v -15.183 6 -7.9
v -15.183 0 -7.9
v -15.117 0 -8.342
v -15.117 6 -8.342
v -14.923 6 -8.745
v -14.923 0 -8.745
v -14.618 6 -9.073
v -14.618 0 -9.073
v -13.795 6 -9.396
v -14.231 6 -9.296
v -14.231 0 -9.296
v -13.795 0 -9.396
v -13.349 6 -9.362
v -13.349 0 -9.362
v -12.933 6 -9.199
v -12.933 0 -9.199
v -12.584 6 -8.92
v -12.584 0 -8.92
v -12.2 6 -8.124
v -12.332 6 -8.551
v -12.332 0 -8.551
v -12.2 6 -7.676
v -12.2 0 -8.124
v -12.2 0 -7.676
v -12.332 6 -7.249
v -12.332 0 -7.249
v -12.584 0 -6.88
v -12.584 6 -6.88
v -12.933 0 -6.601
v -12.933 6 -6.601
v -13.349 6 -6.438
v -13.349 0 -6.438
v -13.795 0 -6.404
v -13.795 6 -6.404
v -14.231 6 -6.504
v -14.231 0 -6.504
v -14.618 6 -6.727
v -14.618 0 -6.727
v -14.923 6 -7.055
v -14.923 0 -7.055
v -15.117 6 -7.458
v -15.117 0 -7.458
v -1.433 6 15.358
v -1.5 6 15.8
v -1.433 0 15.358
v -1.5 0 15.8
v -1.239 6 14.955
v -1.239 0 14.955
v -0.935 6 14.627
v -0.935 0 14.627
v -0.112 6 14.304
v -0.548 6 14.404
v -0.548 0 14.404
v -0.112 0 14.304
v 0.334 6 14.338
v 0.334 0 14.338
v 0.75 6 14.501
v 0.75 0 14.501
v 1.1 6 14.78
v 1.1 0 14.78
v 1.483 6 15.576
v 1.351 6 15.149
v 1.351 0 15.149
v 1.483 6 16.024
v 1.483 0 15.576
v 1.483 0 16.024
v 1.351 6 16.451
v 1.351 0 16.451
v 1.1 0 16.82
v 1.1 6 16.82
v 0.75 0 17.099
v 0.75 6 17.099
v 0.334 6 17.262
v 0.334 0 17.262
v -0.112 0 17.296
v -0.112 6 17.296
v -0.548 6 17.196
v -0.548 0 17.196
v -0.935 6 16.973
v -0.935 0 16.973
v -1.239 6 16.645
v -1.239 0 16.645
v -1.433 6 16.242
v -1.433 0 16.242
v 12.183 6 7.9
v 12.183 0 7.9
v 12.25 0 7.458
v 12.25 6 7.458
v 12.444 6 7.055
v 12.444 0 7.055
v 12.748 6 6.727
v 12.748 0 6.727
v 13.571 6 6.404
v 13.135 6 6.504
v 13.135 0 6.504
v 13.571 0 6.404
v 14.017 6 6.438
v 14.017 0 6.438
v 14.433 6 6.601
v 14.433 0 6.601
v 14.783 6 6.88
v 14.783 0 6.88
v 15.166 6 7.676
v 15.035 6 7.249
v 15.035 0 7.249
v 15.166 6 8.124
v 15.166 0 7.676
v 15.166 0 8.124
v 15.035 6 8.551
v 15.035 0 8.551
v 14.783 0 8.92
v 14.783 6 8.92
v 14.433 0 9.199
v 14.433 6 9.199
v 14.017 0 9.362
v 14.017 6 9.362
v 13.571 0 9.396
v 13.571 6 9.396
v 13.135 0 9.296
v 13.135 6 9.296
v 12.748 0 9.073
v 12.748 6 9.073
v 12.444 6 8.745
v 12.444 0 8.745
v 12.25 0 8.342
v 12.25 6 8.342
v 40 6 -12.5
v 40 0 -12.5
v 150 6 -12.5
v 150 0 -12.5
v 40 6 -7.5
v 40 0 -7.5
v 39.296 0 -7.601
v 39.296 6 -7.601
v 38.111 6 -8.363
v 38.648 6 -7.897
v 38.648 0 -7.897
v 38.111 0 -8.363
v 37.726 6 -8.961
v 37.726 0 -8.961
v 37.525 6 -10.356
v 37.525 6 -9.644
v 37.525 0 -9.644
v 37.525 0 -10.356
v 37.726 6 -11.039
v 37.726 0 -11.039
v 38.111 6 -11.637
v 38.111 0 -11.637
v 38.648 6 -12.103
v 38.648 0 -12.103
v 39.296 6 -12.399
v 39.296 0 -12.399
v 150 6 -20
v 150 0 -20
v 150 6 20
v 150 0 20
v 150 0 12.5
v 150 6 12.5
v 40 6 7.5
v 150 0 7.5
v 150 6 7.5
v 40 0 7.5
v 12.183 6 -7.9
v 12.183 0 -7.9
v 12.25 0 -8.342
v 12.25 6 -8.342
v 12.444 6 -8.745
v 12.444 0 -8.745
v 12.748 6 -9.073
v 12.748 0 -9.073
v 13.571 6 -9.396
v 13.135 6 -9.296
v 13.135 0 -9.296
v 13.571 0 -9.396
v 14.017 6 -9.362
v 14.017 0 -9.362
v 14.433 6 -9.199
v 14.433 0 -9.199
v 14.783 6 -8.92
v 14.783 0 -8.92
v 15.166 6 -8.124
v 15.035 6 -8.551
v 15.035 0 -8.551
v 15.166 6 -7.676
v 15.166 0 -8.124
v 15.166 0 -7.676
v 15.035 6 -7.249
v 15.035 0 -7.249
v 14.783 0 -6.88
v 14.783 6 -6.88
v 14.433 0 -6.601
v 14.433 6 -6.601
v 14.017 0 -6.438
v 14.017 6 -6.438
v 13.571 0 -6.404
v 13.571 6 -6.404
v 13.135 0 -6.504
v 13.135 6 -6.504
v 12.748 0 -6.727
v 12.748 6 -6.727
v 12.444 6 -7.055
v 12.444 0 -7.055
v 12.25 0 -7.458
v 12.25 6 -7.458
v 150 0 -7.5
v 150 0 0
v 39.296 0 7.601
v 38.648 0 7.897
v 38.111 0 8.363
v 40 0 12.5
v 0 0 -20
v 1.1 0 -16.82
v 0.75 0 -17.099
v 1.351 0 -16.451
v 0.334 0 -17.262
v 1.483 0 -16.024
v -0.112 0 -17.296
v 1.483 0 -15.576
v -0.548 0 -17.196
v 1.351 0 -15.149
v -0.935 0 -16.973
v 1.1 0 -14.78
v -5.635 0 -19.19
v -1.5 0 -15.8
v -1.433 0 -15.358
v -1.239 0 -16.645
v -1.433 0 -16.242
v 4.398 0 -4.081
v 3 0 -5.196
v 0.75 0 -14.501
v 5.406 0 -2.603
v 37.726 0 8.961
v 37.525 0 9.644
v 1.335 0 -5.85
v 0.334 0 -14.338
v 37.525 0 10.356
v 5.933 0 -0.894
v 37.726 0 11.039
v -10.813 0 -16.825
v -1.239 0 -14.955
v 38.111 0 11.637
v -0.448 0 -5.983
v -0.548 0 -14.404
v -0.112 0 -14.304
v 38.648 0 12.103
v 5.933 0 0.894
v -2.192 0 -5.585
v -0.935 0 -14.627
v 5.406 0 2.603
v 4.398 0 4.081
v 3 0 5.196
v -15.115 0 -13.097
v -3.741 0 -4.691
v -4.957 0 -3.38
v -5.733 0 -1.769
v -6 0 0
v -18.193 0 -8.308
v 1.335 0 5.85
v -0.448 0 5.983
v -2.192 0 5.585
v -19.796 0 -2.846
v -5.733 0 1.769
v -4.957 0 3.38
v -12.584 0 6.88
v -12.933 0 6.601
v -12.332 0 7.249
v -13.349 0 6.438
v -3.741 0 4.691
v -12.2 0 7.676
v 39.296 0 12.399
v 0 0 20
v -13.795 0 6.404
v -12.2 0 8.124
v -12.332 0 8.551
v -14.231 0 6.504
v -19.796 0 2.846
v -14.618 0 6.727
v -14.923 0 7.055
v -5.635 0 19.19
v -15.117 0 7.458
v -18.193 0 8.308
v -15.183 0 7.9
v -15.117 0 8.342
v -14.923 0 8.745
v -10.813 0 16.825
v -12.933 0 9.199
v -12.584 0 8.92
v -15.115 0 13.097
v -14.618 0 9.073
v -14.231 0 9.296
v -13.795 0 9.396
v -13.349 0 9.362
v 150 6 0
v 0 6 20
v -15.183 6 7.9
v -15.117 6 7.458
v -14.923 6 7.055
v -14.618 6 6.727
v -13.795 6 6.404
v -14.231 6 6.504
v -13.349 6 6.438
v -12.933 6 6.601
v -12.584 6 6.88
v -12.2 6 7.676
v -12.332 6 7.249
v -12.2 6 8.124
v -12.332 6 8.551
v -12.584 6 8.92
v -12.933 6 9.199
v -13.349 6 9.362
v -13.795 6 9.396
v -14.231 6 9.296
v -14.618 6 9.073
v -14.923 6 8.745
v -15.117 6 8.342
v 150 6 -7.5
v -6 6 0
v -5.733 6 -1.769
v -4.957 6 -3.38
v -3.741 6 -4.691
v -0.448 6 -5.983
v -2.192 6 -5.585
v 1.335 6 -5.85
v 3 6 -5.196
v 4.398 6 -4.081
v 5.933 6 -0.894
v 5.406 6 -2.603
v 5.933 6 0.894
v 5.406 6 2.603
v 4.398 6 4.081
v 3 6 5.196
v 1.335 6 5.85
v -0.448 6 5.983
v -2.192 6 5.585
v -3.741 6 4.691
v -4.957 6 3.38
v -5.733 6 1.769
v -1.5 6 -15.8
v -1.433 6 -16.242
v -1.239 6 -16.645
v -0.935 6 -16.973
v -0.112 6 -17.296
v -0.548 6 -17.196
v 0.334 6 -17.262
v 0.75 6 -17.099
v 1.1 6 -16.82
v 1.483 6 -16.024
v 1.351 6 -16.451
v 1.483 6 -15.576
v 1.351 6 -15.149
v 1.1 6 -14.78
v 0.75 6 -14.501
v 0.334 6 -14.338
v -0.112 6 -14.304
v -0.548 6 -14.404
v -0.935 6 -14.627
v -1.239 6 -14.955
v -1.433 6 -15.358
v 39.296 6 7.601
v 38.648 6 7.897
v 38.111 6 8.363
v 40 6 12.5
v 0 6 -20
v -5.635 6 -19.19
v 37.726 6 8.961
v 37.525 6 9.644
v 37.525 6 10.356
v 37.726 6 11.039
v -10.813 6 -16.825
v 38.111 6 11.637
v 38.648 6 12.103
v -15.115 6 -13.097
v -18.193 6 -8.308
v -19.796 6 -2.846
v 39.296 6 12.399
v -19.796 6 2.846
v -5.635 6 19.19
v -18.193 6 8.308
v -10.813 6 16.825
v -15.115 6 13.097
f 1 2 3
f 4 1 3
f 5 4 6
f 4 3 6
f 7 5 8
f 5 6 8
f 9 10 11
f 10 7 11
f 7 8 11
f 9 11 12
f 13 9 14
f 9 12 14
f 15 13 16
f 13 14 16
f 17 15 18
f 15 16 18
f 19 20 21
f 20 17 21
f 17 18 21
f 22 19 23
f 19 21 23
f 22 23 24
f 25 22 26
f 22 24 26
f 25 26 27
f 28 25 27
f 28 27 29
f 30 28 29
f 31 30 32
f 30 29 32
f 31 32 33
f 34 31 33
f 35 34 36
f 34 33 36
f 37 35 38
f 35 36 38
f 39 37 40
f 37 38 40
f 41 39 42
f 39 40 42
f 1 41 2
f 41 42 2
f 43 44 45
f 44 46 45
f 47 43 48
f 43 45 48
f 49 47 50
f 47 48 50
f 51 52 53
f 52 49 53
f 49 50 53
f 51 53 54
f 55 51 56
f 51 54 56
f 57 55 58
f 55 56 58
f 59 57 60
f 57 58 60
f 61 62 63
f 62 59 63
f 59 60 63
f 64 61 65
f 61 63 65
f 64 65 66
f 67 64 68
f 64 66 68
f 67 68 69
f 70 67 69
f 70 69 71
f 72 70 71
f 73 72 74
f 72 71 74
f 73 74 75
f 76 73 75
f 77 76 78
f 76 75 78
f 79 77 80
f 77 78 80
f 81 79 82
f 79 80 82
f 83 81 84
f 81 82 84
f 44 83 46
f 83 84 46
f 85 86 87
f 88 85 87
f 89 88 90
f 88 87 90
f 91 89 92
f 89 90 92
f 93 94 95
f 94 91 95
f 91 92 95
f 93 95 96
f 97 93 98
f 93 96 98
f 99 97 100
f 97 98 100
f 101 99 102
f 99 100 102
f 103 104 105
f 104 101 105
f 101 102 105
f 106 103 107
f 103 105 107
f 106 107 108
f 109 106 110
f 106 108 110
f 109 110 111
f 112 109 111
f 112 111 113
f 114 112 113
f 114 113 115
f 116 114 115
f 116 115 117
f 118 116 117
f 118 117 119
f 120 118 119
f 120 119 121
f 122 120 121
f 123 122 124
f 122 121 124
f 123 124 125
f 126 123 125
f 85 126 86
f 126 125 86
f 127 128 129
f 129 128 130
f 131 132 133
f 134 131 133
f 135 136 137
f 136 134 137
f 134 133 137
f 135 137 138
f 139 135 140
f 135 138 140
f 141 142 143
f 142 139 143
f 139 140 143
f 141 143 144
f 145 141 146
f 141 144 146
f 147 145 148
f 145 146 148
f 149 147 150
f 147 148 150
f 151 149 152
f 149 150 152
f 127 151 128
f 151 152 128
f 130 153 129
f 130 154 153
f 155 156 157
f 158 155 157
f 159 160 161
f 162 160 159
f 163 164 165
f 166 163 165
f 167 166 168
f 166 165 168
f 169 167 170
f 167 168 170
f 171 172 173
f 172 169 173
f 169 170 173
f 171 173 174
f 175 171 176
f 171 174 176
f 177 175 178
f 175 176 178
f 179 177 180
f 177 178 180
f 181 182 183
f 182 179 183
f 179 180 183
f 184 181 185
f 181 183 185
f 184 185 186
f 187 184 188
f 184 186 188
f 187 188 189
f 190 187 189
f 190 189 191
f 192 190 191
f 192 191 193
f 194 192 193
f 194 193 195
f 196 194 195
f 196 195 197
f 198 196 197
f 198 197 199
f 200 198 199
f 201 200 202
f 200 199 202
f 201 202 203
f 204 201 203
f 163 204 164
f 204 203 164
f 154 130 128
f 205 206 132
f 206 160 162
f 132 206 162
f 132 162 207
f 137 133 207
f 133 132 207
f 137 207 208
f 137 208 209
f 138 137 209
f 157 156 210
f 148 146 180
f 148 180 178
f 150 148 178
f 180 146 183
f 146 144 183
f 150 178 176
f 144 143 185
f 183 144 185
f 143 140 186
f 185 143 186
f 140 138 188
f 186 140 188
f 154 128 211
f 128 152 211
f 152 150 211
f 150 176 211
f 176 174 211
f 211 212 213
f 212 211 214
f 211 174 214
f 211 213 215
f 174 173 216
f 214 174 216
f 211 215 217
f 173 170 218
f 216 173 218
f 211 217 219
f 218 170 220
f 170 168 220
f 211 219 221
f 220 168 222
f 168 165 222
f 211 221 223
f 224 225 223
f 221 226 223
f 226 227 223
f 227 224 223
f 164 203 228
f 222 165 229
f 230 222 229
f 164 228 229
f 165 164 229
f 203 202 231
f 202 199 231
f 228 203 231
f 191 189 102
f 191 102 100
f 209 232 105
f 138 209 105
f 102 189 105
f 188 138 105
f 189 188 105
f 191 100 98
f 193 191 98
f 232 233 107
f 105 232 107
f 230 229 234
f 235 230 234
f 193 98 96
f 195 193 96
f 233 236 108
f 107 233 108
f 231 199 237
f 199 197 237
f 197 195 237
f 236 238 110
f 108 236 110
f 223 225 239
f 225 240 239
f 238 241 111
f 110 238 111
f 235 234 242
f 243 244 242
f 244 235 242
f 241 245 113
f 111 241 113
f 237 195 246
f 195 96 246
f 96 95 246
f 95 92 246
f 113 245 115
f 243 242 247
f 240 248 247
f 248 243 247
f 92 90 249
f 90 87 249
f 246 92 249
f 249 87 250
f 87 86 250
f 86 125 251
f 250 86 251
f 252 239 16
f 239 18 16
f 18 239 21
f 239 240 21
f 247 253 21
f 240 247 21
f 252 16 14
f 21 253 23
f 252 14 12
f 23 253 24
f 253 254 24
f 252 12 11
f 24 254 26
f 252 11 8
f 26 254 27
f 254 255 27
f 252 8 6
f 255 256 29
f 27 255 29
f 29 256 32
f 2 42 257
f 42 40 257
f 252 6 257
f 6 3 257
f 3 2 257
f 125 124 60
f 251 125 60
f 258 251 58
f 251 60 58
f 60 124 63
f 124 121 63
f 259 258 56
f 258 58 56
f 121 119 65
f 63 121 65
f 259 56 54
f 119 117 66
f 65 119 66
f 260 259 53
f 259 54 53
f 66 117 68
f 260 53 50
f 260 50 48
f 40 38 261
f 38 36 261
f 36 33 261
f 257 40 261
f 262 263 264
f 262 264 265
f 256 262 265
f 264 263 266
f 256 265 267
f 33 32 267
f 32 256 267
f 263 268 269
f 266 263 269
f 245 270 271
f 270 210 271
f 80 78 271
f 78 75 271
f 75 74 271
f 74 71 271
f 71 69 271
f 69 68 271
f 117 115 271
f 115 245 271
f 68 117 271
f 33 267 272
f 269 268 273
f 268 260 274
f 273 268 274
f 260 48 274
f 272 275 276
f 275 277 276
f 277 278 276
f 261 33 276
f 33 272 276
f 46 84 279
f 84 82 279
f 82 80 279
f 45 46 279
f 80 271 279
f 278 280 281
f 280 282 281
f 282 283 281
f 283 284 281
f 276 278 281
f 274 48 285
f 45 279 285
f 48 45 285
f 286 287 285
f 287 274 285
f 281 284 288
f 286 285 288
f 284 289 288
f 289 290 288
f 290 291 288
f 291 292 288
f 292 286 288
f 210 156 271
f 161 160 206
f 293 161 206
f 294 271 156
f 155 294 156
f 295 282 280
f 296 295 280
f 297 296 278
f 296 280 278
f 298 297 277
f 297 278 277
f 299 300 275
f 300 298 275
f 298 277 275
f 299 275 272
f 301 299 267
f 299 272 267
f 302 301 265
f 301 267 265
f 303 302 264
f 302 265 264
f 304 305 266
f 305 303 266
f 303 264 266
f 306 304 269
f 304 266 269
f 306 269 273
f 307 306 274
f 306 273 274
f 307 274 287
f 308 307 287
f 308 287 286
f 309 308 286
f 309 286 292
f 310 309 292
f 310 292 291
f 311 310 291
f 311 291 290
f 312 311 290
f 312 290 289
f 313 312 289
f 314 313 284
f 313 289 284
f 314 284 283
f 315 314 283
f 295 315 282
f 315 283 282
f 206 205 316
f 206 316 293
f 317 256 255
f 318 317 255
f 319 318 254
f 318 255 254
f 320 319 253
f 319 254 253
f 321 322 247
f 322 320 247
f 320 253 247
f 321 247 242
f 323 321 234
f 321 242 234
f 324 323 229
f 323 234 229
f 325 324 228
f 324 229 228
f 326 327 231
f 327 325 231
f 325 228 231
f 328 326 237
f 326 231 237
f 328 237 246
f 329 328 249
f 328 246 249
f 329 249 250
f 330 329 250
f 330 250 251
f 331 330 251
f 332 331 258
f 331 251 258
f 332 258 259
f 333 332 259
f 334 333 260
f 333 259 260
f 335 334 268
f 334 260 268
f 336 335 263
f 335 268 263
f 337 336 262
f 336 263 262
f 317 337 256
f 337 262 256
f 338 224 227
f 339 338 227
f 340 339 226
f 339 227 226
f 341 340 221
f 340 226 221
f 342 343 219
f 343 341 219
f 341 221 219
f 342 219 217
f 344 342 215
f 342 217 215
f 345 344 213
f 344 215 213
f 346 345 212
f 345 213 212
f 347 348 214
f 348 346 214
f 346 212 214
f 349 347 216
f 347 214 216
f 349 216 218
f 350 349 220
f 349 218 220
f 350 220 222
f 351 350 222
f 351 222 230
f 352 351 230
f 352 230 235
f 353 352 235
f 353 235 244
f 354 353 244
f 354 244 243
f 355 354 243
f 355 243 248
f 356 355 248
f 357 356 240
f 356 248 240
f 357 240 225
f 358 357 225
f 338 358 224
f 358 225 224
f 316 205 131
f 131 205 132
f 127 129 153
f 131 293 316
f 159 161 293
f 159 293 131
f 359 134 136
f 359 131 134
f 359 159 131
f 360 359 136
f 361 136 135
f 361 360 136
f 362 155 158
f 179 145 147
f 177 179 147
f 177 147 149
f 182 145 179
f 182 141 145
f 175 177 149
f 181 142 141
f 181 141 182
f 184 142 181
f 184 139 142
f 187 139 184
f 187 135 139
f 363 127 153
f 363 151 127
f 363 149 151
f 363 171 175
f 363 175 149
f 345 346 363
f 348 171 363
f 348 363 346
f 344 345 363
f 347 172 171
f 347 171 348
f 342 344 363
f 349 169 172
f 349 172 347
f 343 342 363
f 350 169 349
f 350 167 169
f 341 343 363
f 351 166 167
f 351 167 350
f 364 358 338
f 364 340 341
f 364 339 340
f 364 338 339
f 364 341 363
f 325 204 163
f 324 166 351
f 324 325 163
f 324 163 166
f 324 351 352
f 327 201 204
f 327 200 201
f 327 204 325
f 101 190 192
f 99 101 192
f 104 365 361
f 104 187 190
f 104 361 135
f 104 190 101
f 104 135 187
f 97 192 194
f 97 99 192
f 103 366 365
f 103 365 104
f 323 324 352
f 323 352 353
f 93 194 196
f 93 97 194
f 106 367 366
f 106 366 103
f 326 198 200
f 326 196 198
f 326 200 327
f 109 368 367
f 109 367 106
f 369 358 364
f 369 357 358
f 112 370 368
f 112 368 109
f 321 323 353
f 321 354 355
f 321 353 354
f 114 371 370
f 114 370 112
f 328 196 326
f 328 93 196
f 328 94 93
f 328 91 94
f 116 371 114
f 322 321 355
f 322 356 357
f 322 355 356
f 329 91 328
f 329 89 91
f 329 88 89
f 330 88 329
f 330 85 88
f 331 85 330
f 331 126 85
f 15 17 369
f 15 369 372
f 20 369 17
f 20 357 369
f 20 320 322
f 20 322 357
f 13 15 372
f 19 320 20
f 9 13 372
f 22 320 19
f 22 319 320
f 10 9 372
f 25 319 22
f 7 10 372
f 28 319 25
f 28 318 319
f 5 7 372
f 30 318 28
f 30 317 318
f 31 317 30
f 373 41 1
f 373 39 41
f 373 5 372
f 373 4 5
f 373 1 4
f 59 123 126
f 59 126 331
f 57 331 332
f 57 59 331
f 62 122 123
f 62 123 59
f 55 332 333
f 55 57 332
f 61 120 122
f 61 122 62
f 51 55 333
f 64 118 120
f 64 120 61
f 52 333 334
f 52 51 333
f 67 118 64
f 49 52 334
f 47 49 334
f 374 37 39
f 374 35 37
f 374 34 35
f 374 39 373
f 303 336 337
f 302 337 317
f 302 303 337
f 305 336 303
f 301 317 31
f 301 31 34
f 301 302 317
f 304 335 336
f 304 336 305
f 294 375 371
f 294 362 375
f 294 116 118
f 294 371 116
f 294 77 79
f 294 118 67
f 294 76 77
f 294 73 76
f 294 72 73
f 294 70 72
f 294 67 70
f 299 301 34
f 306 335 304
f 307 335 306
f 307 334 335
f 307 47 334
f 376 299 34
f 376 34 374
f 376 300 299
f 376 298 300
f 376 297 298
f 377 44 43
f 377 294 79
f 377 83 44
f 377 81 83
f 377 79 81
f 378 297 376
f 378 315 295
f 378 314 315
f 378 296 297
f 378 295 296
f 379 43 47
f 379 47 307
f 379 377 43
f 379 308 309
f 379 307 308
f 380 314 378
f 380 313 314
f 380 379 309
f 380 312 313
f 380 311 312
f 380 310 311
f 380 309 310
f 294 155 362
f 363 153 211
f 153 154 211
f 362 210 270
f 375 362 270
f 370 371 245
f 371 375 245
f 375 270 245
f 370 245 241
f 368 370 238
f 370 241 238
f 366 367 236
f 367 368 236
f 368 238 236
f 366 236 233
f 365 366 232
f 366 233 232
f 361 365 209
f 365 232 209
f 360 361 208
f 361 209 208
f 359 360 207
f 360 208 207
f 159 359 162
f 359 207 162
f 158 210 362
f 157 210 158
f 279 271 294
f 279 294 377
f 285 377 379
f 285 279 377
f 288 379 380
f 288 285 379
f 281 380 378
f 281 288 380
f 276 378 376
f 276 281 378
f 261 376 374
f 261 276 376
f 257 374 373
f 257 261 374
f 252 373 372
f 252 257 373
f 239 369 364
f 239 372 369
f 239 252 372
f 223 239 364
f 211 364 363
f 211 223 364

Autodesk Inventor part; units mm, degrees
ref_plane "YZ Plane" through (0, 0, 0) normal (1, 0, 0) x (0, 1, 0)
ref_plane "XZ Plane" through (0, 0, 0) normal (0, 1, 0) x (-1, 0, 0)
ref_plane "XY Plane" through (0, 0, 0) normal (0, 0, 1) x (1, 0, 0)
sketch "sketch1--base" plane through (0, 0, 0) normal (0, 1, 0) x (-1, 0, 0)
  line L0 (-18.2322, -18.2322) -> (18.2322, 18.2322) construction
  line L1 (21.7082, -21.7082) -> (-21.7082, 21.7082) construction
  line L2 (-20, -20) -> (20, -20) construction
  line L3 (20, -20) -> (20, 20) construction
  line L4 (20, 20) -> (-20, 20) construction
  line L5 (-20, 20) -> (-20, -20) construction
  line L6 (-20, -20) -> (20, 20) construction
  line L7 (20, -20) -> (-20, 20) construction
  line L8 (-21.7678, -21.7678) -> (21.7678, 21.7678) construction
  line L9 (21.7678, -21.7678) -> (-21.7678, 21.7678) construction
  circle A0 centre (-20, 20) radius 2.5 construction
  circle A1 centre (20, 20) radius 2.5 construction
  circle A2 centre (20, -20) radius 2.5 construction
  circle A3 centre (-20, -20) radius 2.5 construction
  arc A4 (17.5, 20) -> (20, 17.5) centre (20, 20) ccw
  arc A5 (20, -17.5) -> (17.5, -20) centre (20, -20) ccw
  arc A6 (-20, 17.5) -> (-17.5, 20) centre (-20, 20) ccw
  arc A7 (-17.5, -20) -> (-20, -17.5) centre (-20, -20) ccw
  line L10 (-17.5, -20) -> (17.5, -20)
  line L11 (-20, -17.5) -> (-20, 17.5)
  line L12 (0, -20) -> (0, 20) construction
  line L13 (20, 0) -> (-20, 0) construction
  line L14 (20, -17.5) -> (20, 17.5)
  line L15 (17.5, 20) -> (-17.5, 20)
  point P0 (0, 0)
  point P1 (20, 0)
  dimension "d6" = 40
  dimension "screw__diameter" = 5
  dimension "d24" = 40
sketch "sketch2--component" plane through (0, 0, 0) normal (0, 1, 0) x (-1, 0, 0)
  circle A0 centre (0, 0) radius 18.5
  circle A1 centre (0, 0) radius 15.8 construction
  circle A2 centre (0, -15.8) radius 1.5
  circle A3 centre (0, 0) radius 17.3 construction
  circle A4 centre (13.6832, -7.9) radius 1.5
  circle A5 centre (13.6832, 7.9) radius 1.5
  circle A6 centre (0, 15.8) radius 1.5
  circle A7 centre (-13.6832, 7.9) radius 1.5
  circle A8 centre (-13.6832, -7.9) radius 1.5
  circle A9 centre (0, 0) radius 6
  dimension "d40" = 37
  dimension "d41" = 1.2
  dimension "d42" = 3
  dimension "d45" = 360
  dimension "d49" = 12
sketch "Sketch3--union" plane through (0, 0, 0) normal (0, 1, 0) x (-1, 0, 0)
  circle A0 centre (13.6832, 7.9) radius 1.5 projected
  circle A1 centre (13.6832, -7.9) radius 1.5 projected
  circle A2 centre (0, -15.8) radius 1.5 projected
  circle A3 centre (-13.6832, -7.9) radius 1.5 projected
  circle A4 centre (-13.6832, 7.9) radius 1.5 projected
  circle A5 centre (0, 15.8) radius 1.5 projected
  circle A6 centre (0, 0) radius 20 construction
  line L0 (20, -20) -> (20, 20) construction
  arc A7 (0, -20) -> (0, 20) centre (0, 0) ccw
  line L1 (0, -20) -> (0, 20) construction
  line L2 (0, 20) -> (-150, 20)
  line L3 (-150, -20) -> (0, -20)
  line L4 (-20, 20) -> (-20, -20) construction
  line L5 (-20, 20) -> (-150, 0) construction
  line L6 (-20, 0) -> (-150, 20) construction
  line L7 (20, 0) -> (-20, 0) construction
  circle A8 centre (20, 20) radius 2.5 construction
  circle A9 centre (0, 0) radius 6 projected
  line L8 (-132.5, 10) -> (-37.5, 10) construction
  line L9 (-132.5, 10) -> (-37.5, 10) construction
  line L10 (-150, 7.5) -> (-40, 7.5)
  line L11 (-40, 12.5) -> (-150, 12.5)
  arc A10 (-40, 7.5) -> (-40, 12.5) centre (-40, 10) ccw
  line L12 (-150, 20) -> (-150, 12.5)
  line L13 (-150, 7.5) -> (-150, 0)
  line L14 (-150, -7.5) -> (-40, -7.5)
  line L15 (-40, -12.5) -> (-150, -12.5)
  arc A11 (-40, -12.5) -> (-40, -7.5) centre (-40, -10) ccw
  line L16 (-150, -20) -> (-150, -12.5)
  line L17 (-150, -7.5) -> (-150, 0)
  point P0 (-85, 10)
  point P1 (-85, 10)
  point P2 (-85, 10)
  dimension "d52" = 2.5
  dimension "d53" = 130
  dimension "d54" = 20
extrude "Extrusion3--base" add sketch "Sketch3--union" along normal blind 6
equation "\"d6\" = module__size"
equation "\"d24\" = d6"
equation "\"d50\" = module__height"
equation "\"module__height\" = 6"
equation "\"module__size\" = 40"
properties part number "work-area--holder--motor"
